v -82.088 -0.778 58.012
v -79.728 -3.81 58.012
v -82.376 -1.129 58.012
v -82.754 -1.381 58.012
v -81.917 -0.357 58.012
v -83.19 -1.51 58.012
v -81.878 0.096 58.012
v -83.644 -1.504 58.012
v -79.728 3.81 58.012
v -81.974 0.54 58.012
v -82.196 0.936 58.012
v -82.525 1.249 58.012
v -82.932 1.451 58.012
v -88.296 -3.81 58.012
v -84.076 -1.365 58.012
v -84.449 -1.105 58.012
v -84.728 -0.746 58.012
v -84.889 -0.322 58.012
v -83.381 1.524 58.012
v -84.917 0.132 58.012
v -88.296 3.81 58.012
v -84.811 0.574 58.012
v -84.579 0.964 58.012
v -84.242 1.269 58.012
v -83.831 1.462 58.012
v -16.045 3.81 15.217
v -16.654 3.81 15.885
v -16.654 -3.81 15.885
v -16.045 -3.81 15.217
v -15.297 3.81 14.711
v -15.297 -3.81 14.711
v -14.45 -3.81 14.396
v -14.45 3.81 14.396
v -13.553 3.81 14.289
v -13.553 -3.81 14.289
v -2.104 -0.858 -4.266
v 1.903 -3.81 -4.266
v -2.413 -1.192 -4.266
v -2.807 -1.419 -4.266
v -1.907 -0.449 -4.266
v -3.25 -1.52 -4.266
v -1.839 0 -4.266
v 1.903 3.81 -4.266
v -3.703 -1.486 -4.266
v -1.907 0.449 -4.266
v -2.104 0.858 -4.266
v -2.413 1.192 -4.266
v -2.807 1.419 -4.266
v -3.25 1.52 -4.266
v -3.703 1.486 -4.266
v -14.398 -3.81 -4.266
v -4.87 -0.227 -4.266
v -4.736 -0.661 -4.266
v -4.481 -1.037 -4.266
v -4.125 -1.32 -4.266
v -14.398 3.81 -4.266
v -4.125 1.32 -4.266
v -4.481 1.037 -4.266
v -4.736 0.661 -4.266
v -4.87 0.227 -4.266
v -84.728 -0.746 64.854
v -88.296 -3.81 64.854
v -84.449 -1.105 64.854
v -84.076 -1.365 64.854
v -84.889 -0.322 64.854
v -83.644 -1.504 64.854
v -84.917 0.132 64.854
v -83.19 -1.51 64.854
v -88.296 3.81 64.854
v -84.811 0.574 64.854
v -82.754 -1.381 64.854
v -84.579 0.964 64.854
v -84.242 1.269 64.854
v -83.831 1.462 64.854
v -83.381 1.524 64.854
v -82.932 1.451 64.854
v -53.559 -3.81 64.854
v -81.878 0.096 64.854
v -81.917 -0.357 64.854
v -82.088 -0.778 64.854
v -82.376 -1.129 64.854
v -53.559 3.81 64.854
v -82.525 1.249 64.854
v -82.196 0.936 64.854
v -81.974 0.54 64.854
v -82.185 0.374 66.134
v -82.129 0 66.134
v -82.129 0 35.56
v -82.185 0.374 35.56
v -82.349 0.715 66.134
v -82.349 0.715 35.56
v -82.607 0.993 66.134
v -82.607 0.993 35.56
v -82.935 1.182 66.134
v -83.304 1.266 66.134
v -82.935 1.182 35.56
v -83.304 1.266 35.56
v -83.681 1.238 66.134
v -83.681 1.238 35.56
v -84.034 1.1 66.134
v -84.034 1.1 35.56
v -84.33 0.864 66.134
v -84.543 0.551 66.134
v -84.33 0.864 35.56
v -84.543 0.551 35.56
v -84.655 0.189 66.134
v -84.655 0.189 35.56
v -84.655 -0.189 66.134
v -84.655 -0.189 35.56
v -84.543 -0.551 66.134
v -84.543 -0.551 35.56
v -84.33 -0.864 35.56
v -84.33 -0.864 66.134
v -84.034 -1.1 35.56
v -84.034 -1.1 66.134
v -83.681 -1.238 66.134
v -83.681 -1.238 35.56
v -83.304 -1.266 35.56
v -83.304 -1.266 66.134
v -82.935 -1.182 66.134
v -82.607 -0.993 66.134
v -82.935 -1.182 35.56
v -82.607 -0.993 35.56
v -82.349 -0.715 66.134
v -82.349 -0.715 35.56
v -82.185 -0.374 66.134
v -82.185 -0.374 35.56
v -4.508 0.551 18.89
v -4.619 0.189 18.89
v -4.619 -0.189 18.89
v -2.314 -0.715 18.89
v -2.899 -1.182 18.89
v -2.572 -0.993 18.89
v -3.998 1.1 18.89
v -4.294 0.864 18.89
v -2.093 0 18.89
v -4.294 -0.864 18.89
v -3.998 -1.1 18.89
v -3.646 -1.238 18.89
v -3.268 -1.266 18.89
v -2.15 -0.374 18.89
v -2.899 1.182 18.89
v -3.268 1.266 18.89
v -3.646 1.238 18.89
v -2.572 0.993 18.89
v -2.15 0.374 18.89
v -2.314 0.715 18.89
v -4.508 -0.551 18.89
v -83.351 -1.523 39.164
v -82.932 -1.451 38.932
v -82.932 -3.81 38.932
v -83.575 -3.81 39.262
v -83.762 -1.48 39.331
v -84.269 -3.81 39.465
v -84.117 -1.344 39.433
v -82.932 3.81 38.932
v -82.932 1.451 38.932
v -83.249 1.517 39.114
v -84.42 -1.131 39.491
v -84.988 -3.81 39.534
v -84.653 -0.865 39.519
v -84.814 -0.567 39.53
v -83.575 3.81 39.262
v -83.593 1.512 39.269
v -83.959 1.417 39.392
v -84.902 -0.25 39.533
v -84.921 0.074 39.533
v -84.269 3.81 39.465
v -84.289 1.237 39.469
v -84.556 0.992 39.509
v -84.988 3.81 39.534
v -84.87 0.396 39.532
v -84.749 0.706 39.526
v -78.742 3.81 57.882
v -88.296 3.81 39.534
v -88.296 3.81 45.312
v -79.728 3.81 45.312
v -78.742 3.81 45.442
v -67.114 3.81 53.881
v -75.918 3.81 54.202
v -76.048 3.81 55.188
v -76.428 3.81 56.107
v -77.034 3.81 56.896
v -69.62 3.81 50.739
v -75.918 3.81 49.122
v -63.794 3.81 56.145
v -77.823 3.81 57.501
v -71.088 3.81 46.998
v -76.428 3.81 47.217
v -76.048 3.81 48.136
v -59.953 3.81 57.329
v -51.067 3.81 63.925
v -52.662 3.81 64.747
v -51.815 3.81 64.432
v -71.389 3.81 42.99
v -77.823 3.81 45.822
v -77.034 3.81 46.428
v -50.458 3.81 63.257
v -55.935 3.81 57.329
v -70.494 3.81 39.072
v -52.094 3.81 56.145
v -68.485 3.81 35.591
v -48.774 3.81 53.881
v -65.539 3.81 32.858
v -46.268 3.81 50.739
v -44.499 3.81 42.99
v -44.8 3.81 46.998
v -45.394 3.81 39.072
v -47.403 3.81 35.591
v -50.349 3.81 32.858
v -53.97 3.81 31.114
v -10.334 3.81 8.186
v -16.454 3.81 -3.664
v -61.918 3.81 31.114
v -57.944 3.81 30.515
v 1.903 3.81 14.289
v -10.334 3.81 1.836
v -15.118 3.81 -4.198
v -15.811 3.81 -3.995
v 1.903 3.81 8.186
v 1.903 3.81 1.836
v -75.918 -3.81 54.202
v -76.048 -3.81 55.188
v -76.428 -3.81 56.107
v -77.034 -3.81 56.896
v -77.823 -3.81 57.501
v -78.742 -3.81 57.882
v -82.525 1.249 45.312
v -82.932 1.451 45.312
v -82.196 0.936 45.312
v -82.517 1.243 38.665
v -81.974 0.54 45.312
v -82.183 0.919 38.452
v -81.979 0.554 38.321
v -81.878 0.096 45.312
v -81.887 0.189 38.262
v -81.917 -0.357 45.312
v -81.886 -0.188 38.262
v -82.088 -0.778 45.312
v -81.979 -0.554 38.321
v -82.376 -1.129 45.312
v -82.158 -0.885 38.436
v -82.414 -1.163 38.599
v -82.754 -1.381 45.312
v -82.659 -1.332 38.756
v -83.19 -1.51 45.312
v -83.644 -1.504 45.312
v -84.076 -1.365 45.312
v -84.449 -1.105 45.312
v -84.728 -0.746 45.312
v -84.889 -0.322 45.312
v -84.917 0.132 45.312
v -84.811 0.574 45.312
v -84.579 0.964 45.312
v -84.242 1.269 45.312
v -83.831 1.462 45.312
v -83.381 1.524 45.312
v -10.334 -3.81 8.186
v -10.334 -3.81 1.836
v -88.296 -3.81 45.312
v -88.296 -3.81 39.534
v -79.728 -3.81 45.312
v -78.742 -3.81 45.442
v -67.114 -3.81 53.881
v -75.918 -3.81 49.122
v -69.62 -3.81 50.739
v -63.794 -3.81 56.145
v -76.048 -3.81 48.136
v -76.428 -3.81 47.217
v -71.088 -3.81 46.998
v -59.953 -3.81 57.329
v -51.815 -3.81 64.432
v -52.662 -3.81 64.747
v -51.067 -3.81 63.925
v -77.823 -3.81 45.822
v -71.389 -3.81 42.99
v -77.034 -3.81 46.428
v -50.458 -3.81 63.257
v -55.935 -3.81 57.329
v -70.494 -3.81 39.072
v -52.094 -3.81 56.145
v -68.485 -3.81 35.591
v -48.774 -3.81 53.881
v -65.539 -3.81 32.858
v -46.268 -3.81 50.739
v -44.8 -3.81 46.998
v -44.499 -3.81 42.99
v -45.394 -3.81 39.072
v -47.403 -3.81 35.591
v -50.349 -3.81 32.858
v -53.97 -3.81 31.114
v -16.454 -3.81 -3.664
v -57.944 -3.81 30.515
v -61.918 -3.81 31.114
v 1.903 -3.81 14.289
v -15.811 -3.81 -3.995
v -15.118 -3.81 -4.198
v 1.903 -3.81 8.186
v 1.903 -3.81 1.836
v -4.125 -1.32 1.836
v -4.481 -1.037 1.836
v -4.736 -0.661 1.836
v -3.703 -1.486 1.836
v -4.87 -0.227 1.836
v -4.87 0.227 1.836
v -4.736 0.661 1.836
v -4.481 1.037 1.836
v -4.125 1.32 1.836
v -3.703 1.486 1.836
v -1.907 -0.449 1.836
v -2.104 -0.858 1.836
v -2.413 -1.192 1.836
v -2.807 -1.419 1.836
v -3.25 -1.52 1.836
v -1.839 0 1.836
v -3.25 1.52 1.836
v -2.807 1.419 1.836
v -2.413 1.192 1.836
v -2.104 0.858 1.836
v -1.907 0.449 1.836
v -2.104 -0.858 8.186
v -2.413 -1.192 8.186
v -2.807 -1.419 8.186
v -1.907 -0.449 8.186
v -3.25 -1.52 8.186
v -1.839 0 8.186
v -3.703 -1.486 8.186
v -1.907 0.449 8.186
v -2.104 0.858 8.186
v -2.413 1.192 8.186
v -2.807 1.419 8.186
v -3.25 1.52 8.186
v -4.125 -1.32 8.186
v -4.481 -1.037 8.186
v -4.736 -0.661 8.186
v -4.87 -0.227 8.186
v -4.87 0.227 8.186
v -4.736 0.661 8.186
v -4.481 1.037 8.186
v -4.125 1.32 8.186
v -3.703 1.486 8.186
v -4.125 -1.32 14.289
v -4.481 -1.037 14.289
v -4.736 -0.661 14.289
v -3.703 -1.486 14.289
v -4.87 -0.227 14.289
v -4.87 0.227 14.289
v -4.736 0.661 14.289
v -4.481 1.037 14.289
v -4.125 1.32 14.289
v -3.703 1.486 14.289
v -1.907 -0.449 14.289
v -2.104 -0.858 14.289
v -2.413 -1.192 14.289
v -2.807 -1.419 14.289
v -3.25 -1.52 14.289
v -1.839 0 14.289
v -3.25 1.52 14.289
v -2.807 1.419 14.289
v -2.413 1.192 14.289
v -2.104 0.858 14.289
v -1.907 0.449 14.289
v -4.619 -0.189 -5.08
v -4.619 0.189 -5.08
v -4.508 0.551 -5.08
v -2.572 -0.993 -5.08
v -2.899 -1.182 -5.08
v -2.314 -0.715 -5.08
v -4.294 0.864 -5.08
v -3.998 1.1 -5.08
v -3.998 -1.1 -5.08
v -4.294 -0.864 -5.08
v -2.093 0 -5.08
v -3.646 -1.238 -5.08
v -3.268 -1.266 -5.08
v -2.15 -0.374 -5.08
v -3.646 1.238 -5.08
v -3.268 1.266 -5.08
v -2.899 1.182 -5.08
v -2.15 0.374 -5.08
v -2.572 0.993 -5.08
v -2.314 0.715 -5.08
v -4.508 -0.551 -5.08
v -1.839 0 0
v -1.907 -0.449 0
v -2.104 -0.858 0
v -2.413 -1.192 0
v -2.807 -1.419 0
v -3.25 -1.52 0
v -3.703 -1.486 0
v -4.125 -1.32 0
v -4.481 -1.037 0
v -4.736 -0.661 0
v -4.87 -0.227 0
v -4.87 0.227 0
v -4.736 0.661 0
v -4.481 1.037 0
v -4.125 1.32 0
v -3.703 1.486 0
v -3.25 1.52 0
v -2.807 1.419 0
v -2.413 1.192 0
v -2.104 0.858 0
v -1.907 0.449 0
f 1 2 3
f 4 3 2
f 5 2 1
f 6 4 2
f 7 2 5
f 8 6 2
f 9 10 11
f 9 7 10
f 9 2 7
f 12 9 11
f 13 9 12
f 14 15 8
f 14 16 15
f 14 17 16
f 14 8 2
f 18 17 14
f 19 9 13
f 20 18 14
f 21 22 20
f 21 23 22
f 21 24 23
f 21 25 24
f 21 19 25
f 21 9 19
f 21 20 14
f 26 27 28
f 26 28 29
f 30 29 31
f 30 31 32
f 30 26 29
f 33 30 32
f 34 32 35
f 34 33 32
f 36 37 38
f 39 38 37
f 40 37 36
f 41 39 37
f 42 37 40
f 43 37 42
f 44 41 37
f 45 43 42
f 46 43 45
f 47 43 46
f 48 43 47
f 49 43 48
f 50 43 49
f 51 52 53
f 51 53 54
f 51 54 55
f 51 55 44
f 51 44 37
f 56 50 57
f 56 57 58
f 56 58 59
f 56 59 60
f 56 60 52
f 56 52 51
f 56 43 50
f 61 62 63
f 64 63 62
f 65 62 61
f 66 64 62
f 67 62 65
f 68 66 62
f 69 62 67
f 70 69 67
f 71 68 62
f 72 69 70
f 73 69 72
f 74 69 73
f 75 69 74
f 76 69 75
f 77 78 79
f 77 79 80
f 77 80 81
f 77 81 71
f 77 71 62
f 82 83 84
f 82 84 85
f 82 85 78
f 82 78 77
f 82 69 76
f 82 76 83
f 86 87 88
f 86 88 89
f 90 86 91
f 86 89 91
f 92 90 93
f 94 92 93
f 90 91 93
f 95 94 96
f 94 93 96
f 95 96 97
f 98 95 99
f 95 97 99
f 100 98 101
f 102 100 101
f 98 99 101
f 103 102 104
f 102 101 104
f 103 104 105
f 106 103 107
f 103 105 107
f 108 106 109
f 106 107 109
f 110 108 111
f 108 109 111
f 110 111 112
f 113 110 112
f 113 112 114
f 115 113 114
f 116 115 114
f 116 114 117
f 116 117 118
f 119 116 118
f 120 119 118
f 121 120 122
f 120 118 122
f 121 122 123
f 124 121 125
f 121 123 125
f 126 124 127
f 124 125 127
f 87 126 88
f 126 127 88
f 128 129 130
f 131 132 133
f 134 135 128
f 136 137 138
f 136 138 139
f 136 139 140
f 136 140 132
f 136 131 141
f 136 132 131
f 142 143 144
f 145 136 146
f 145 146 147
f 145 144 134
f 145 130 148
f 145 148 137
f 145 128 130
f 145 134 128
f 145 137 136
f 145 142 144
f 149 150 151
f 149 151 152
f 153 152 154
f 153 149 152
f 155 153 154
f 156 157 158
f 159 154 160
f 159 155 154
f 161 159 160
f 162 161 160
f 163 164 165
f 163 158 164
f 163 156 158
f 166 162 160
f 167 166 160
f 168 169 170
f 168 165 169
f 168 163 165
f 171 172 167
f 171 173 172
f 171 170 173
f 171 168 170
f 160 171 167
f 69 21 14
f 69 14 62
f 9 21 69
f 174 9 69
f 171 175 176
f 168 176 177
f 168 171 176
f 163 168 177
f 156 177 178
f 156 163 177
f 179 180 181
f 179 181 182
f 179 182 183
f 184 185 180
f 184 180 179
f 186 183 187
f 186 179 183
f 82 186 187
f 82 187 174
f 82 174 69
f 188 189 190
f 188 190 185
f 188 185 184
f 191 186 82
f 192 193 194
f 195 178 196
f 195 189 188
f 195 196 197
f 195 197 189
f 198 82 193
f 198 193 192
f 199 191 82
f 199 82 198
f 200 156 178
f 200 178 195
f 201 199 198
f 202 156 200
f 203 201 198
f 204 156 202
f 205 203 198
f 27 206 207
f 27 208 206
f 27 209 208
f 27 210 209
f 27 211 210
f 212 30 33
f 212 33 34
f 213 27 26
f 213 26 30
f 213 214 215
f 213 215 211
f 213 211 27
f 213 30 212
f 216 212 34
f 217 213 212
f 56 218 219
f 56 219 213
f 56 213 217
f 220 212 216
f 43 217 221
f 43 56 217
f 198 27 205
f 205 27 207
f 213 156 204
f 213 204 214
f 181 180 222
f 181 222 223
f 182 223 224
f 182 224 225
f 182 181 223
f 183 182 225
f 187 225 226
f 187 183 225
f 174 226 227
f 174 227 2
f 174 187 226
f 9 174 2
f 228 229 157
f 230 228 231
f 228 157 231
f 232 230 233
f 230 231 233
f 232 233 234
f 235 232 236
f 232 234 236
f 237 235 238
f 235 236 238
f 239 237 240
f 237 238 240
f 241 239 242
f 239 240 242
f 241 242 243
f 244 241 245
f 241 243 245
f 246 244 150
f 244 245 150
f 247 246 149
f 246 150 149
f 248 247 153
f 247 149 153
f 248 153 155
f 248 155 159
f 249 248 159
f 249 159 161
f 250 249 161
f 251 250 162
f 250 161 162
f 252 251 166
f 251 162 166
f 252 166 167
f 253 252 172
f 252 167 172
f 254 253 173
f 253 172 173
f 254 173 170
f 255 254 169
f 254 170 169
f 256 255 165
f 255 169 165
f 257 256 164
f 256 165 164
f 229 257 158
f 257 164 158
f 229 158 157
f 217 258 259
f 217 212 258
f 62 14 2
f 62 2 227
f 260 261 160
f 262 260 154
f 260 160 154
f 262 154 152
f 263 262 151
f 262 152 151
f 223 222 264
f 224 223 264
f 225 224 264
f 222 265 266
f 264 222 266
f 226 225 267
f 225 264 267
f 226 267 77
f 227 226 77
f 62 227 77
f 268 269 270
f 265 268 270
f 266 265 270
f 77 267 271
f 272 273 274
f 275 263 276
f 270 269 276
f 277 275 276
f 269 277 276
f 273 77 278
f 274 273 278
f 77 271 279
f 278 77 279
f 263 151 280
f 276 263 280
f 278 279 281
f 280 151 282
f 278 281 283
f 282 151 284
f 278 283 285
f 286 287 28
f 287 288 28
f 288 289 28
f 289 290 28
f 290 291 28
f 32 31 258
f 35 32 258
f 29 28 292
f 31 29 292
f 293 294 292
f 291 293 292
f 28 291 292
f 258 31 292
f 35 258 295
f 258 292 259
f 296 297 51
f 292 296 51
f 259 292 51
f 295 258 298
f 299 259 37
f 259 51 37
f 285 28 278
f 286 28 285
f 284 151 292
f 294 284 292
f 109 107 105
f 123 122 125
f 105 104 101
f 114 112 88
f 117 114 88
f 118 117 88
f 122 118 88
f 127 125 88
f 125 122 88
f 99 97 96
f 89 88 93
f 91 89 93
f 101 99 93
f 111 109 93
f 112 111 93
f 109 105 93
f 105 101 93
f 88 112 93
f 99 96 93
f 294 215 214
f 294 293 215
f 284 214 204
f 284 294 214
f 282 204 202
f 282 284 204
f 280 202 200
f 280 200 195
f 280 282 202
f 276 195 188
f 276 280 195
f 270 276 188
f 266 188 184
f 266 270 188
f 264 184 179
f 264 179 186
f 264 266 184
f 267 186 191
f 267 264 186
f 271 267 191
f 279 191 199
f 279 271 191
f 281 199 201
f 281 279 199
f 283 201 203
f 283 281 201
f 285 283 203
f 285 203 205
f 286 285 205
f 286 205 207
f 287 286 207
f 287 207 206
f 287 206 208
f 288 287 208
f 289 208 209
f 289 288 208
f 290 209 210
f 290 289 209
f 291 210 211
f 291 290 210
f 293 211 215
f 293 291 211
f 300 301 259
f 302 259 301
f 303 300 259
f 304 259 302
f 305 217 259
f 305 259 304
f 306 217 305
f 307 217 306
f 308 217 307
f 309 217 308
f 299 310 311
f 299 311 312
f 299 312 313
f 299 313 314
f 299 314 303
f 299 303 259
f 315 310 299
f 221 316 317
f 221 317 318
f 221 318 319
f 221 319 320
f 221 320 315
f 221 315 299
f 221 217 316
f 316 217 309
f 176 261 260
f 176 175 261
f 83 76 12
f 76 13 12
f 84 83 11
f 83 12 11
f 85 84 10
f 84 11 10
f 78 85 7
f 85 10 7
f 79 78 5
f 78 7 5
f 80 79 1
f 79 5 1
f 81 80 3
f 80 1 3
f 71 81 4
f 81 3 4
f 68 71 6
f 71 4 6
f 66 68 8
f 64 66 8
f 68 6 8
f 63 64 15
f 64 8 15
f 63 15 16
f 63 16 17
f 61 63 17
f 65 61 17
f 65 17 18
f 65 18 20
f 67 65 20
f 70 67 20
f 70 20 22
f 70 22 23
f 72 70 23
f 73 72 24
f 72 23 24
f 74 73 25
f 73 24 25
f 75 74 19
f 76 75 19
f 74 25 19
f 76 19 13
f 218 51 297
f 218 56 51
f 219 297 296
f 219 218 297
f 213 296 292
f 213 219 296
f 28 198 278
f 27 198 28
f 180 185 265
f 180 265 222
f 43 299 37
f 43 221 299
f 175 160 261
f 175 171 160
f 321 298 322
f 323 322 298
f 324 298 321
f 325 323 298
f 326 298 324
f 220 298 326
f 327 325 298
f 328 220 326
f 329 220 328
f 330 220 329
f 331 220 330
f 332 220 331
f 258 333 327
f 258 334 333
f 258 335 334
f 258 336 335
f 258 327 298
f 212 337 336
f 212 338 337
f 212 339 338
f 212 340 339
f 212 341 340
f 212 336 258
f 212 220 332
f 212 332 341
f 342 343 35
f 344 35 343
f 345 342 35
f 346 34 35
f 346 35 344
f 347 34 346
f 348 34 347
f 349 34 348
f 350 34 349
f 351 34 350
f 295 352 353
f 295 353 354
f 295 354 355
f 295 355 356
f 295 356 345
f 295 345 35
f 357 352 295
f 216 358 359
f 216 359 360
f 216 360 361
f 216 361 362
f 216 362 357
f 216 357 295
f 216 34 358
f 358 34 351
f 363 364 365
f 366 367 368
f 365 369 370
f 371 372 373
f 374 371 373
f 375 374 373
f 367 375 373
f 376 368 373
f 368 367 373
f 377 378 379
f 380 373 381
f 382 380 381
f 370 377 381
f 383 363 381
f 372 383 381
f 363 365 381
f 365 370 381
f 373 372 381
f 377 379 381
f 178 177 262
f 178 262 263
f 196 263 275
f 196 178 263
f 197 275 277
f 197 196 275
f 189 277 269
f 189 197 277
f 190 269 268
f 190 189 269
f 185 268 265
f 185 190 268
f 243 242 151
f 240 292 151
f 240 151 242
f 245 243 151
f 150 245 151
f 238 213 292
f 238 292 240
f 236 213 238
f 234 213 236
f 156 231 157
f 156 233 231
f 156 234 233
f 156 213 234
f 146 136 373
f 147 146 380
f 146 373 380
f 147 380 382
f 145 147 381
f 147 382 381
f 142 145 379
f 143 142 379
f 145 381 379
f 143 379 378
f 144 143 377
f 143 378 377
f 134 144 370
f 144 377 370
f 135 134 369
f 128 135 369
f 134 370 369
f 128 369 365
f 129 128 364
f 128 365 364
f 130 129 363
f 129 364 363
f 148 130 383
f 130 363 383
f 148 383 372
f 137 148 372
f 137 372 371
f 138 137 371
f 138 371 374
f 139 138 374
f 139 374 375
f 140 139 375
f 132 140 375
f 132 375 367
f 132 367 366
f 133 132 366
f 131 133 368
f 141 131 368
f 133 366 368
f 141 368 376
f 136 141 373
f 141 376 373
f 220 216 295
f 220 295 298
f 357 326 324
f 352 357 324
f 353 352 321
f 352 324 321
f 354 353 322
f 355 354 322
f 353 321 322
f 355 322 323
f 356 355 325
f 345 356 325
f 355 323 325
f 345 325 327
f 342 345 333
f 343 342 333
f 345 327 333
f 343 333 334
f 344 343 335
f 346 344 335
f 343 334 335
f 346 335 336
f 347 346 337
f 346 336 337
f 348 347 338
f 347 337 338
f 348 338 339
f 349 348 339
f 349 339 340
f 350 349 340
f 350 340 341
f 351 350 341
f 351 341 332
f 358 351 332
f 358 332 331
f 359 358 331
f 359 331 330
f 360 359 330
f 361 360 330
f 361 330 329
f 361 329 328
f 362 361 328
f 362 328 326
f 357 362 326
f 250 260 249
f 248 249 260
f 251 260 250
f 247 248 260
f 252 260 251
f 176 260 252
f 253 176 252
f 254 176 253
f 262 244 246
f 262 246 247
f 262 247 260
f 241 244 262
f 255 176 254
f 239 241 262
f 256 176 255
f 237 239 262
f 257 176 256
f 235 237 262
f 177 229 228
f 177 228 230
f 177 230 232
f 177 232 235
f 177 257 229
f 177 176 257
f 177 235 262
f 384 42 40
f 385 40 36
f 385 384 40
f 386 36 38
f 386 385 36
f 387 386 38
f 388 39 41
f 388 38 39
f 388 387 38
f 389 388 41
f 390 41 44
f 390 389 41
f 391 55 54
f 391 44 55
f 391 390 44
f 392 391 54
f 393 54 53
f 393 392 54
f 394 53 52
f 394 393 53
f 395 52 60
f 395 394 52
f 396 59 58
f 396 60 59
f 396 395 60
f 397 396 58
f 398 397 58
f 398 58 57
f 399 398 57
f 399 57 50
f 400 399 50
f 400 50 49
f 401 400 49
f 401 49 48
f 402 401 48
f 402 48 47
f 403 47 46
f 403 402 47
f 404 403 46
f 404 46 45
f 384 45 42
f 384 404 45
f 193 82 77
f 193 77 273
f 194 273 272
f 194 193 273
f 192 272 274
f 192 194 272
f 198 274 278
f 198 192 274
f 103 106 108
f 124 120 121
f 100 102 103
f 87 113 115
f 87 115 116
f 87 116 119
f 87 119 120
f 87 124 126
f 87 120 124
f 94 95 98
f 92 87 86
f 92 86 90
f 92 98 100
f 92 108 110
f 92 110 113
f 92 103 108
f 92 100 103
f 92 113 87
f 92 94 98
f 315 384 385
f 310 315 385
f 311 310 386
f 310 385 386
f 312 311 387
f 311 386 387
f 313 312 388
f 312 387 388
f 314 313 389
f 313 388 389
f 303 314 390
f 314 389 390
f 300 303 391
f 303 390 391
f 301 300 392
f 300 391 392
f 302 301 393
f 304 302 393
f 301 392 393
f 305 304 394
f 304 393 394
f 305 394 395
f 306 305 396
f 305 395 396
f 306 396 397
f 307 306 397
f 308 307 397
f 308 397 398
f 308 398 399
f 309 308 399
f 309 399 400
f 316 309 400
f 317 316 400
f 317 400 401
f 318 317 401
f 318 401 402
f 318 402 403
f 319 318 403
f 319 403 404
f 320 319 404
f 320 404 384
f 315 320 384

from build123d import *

# Parameters (mm, degrees)
SKETCH21_R     = 13.482411093
EXTRUDE1_DEPTH = 3.81
SKETCH22_R     = 1.524
EXTRUDE2_DEPTH = 64.8716
EXTRUDE3_START = 35.56
SKETCH23_R     = 1.27
EXTRUDE3_DEPTH = 30.574
EXTRUDE4_START = -5.08
SKETCH23_3_R   = 1.27
EXTRUDE4_DEPTH = 23.97


with BuildPart() as part:
    # Sketch21 → Extrude1 (new, symmetric)
    with BuildSketch(Plane(origin=(0, 0, 0), x_dir=(1, 0, 0), z_dir=(0, 1, 0))):
        with BuildLine():
            Line((-88.295770636, -45.311842545), (-79.727880739, -45.311842545))
            ThreePointArc((-79.727880739, -45.311842545), (-77.033803903, -46.427765709), (-75.917880739, -49.121842545))
            Line((-75.917880739, -49.121842545), (-75.917880739, -54.201842545))
            ThreePointArc((-75.917880739, -54.201842545), (-77.033803903, -56.895919382), (-79.727880739, -58.011842545))
            Line((-79.727880739, -58.011842545), (-88.295770636, -58.011842545))
            Line((-88.295770636, -58.011842545), (-88.295770636, -64.854185734))
            Line((-88.295770636, -64.854185734), (-70.51372875, -64.854185734))
            Line((-70.51372875, -64.854185734), (-53.559395609, -64.854185734))
            ThreePointArc((-53.559395609, -64.854185734), (-51.815232505, -64.431514338), (-50.458055152, -63.257280258))
            Line((-50.458055152, -63.257280258), (-16.653859035, -15.885457734))
            ThreePointArc((-16.653859035, -15.885457734), (-15.296681682, -14.711223655), (-13.552518579, -14.288552258))
            Line((-13.552518579, -14.288552258), (1.902726124, -14.288552258))
            Line((1.902726124, -14.288552258), (1.902726124, -8.186070905))
            Line((1.902726124, -8.186070905), (-10.334062324, -8.186070905))
            Line((-10.334062324, -8.186070905), (-10.334062324, -1.836070905))
            Line((-10.334062324, -1.836070905), (1.902726124, -1.836070905))
            Line((1.902726124, -1.836070905), (1.902726124, 4.266410449))
            Line((1.902726124, 4.266410449), (-14.39840261, 4.266410449))
            ThreePointArc((-14.39840261, 4.266410449), (-15.469328765, 4.112804461), (-16.453902861, 3.664372219))
            Line((-16.453902861, 3.664372219), (-82.93238161, -38.931687082))
            ThreePointArc((-82.93238161, -38.931687082), (-83.916955706, -39.380119324), (-84.987881861, -39.533725312))
            Line((-84.987881861, -39.533725312), (-88.295770636, -39.533725312))
            Line((-88.295770636, -39.533725312), (-88.295770636, -45.311842545))
        make_face()
        with Locations((-57.943964273, -43.997390879)):
            Circle(SKETCH21_R, mode=Mode.SUBTRACT)
    extrude(amount=EXTRUDE1_DEPTH, both=True)

    # Sketch22 → Extrude2 (cut, symmetric)
    with BuildSketch(Plane(origin=(-0.80037255, 0, 0), x_dir=(-1, 0, 0), z_dir=(0, 0, -1))):
        with Locations((2.563026803, 0)):
            Circle(SKETCH22_R)
        with Locations((82.598426803, 0)):
            Circle(SKETCH22_R)
    extrude(amount=EXTRUDE2_DEPTH, both=True, mode=Mode.SUBTRACT)


with BuildPart() as body_2:
    # Sketch23 → Extrude3 (new body)
    with BuildSketch(Plane.XY.offset(EXTRUDE3_START)):
        with Locations((-83.398799353, 0)):
            Circle(SKETCH23_R)
    extrude(amount=EXTRUDE3_DEPTH)


with BuildPart() as body_3:
    # Sketch23<3> → Extrude4 (new body)
    with BuildSketch(Plane.XY.offset(EXTRUDE4_START)):
        with Locations((-3.363399353, 0)):
            Circle(SKETCH23_3_R)
    extrude(amount=EXTRUDE4_DEPTH)


solid = Compound([part.part, body_2.part, body_3.part])
